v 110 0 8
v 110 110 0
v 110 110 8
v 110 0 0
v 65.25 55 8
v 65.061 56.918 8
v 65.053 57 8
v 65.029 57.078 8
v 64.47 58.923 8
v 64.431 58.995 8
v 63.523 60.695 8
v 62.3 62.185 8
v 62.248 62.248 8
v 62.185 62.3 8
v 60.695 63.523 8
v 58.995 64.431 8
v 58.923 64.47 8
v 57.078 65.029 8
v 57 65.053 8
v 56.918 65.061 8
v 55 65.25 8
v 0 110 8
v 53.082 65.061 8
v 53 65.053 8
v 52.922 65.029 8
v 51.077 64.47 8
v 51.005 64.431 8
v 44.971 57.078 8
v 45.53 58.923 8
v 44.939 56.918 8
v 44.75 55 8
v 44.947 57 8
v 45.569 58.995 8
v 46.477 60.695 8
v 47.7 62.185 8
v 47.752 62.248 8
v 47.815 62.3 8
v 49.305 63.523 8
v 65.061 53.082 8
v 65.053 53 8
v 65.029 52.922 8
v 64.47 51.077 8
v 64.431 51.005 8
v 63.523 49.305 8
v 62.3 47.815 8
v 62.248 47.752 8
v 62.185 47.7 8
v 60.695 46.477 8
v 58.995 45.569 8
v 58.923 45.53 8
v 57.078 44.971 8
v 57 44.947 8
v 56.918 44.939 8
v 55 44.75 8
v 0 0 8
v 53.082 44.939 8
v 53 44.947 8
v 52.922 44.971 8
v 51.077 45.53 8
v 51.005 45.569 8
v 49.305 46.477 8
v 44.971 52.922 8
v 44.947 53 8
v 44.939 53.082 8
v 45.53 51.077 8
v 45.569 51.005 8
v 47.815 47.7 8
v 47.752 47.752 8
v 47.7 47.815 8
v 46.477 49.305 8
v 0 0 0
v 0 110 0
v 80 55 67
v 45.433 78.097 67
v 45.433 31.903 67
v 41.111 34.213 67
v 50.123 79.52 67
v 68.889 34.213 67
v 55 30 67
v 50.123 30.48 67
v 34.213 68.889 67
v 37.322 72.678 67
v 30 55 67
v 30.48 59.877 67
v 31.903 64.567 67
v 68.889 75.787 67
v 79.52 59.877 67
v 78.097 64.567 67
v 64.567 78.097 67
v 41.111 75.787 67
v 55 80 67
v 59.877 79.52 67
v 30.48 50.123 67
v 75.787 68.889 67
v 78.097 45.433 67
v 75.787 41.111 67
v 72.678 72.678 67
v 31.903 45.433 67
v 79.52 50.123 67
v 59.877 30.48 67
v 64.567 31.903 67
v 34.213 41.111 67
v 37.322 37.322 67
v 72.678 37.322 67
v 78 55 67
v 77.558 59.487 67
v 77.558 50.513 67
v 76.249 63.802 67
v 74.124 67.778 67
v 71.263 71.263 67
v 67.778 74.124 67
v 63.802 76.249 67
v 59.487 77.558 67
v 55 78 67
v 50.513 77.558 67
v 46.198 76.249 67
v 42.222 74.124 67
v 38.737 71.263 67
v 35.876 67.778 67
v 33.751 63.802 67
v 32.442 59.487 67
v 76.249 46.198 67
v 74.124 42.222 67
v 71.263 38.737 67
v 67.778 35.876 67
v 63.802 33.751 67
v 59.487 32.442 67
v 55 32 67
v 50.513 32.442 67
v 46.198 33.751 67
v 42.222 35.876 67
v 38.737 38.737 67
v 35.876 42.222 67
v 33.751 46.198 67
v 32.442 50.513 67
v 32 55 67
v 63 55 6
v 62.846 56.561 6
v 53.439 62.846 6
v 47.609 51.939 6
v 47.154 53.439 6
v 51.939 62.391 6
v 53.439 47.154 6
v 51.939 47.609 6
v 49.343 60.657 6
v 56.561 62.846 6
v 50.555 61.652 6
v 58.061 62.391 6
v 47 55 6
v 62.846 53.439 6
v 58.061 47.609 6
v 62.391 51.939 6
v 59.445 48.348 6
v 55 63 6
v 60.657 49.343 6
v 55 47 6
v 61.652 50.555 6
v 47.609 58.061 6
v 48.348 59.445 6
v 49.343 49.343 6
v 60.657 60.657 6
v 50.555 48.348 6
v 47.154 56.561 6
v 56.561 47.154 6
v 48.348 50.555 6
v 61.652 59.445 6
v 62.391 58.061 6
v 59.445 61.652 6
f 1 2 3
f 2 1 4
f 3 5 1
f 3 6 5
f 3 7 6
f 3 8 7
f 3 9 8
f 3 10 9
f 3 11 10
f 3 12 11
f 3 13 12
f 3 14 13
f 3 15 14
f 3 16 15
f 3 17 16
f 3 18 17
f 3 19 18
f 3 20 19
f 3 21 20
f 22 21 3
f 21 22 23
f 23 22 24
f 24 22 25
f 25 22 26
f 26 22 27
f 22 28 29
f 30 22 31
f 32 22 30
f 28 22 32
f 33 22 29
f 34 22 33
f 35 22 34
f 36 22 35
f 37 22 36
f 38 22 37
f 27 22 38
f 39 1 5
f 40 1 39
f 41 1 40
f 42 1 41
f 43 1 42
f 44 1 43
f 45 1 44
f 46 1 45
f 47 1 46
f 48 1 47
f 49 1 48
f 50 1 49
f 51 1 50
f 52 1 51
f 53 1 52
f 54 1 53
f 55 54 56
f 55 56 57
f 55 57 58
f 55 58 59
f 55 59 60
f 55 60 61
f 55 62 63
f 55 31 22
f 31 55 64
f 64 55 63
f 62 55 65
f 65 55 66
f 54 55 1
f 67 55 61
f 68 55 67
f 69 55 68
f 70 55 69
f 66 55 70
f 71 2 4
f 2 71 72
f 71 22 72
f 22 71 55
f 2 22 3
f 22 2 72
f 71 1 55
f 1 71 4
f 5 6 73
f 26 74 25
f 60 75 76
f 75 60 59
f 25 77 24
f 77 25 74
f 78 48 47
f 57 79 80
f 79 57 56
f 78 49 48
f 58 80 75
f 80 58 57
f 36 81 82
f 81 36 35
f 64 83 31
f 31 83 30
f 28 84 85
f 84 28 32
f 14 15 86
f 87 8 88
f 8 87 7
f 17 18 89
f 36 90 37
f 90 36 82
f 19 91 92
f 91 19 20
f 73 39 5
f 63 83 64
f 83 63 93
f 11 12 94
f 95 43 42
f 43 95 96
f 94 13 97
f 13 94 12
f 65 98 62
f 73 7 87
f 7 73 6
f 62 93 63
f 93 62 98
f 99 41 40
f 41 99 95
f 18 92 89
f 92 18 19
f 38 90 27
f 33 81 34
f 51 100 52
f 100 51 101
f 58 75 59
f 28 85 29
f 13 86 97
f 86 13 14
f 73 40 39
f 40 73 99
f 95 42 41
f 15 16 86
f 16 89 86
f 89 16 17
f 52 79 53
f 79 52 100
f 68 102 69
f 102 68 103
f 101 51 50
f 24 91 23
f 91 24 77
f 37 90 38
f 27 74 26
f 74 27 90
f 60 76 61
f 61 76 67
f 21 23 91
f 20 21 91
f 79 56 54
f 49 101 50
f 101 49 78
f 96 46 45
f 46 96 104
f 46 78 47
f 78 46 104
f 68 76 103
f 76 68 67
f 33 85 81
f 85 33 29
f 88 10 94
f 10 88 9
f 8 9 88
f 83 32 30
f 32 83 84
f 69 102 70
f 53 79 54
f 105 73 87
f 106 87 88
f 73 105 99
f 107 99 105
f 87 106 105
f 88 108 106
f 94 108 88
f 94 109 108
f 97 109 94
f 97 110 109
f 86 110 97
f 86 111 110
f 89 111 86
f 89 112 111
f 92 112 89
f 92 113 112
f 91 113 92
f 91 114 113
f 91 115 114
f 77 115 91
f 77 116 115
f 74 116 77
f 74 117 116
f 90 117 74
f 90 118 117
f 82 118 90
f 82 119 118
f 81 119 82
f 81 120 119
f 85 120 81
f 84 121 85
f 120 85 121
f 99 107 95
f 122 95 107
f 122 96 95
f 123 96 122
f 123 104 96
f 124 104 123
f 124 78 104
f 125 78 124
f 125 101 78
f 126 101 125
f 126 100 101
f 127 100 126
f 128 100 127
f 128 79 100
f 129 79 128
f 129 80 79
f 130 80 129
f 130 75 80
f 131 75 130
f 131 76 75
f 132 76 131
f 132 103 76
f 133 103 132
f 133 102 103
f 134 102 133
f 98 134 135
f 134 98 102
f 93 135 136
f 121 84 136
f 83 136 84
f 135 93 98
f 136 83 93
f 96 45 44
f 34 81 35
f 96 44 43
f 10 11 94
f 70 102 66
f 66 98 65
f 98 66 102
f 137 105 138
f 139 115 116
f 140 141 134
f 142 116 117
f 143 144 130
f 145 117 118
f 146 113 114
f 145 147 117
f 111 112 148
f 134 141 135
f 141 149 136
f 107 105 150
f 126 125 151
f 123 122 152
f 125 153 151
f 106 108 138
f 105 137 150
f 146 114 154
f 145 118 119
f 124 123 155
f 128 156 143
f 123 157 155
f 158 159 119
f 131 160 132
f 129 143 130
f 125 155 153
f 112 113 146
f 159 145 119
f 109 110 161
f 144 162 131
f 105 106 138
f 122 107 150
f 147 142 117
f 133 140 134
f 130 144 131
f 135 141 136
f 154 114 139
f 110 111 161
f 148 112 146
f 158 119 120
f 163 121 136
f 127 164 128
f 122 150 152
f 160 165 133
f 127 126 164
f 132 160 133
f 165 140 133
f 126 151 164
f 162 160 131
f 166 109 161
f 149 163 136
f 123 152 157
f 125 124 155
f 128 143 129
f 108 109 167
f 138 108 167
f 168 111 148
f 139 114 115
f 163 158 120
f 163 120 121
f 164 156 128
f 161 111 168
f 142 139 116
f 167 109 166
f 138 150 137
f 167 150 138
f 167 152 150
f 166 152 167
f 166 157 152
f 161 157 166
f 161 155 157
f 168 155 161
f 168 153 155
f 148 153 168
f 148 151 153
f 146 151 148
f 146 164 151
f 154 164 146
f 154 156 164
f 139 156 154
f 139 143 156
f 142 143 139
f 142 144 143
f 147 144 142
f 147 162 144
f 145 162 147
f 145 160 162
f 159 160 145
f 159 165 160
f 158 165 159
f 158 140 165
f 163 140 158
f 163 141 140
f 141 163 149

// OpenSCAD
$fn = 32;

// ----------------------------------------------------------------------
// Hopper: funnel with square flange
// ----------------------------------------------------------------------

// --- parameters (mm) ---
fl = 110;                 // flange side, X and Y
fl_t = 8;                 // flange thickness
cone_h = 60;              // cone height above the flange
top_d = 50;               // cone mouth diameter
bot_d = 20;               // cone spout diameter
wall = 2;                 // cone wall thickness

bore_d = bot_d - 2 * wall;  // spout bore diameter
total_h = fl_t + cone_h - 1;  // overall height

difference() {
  union() {
    cube([fl, fl, fl_t]);
    translate([fl / 2, fl / 2, fl_t - 1])
      cylinder(h = cone_h, d1 = bot_d, d2 = top_d);
  }
  translate([fl / 2, fl / 2, fl_t - 2])
    cylinder(h = cone_h + 1, d1 = bore_d, d2 = top_d - 2 * wall);
}
